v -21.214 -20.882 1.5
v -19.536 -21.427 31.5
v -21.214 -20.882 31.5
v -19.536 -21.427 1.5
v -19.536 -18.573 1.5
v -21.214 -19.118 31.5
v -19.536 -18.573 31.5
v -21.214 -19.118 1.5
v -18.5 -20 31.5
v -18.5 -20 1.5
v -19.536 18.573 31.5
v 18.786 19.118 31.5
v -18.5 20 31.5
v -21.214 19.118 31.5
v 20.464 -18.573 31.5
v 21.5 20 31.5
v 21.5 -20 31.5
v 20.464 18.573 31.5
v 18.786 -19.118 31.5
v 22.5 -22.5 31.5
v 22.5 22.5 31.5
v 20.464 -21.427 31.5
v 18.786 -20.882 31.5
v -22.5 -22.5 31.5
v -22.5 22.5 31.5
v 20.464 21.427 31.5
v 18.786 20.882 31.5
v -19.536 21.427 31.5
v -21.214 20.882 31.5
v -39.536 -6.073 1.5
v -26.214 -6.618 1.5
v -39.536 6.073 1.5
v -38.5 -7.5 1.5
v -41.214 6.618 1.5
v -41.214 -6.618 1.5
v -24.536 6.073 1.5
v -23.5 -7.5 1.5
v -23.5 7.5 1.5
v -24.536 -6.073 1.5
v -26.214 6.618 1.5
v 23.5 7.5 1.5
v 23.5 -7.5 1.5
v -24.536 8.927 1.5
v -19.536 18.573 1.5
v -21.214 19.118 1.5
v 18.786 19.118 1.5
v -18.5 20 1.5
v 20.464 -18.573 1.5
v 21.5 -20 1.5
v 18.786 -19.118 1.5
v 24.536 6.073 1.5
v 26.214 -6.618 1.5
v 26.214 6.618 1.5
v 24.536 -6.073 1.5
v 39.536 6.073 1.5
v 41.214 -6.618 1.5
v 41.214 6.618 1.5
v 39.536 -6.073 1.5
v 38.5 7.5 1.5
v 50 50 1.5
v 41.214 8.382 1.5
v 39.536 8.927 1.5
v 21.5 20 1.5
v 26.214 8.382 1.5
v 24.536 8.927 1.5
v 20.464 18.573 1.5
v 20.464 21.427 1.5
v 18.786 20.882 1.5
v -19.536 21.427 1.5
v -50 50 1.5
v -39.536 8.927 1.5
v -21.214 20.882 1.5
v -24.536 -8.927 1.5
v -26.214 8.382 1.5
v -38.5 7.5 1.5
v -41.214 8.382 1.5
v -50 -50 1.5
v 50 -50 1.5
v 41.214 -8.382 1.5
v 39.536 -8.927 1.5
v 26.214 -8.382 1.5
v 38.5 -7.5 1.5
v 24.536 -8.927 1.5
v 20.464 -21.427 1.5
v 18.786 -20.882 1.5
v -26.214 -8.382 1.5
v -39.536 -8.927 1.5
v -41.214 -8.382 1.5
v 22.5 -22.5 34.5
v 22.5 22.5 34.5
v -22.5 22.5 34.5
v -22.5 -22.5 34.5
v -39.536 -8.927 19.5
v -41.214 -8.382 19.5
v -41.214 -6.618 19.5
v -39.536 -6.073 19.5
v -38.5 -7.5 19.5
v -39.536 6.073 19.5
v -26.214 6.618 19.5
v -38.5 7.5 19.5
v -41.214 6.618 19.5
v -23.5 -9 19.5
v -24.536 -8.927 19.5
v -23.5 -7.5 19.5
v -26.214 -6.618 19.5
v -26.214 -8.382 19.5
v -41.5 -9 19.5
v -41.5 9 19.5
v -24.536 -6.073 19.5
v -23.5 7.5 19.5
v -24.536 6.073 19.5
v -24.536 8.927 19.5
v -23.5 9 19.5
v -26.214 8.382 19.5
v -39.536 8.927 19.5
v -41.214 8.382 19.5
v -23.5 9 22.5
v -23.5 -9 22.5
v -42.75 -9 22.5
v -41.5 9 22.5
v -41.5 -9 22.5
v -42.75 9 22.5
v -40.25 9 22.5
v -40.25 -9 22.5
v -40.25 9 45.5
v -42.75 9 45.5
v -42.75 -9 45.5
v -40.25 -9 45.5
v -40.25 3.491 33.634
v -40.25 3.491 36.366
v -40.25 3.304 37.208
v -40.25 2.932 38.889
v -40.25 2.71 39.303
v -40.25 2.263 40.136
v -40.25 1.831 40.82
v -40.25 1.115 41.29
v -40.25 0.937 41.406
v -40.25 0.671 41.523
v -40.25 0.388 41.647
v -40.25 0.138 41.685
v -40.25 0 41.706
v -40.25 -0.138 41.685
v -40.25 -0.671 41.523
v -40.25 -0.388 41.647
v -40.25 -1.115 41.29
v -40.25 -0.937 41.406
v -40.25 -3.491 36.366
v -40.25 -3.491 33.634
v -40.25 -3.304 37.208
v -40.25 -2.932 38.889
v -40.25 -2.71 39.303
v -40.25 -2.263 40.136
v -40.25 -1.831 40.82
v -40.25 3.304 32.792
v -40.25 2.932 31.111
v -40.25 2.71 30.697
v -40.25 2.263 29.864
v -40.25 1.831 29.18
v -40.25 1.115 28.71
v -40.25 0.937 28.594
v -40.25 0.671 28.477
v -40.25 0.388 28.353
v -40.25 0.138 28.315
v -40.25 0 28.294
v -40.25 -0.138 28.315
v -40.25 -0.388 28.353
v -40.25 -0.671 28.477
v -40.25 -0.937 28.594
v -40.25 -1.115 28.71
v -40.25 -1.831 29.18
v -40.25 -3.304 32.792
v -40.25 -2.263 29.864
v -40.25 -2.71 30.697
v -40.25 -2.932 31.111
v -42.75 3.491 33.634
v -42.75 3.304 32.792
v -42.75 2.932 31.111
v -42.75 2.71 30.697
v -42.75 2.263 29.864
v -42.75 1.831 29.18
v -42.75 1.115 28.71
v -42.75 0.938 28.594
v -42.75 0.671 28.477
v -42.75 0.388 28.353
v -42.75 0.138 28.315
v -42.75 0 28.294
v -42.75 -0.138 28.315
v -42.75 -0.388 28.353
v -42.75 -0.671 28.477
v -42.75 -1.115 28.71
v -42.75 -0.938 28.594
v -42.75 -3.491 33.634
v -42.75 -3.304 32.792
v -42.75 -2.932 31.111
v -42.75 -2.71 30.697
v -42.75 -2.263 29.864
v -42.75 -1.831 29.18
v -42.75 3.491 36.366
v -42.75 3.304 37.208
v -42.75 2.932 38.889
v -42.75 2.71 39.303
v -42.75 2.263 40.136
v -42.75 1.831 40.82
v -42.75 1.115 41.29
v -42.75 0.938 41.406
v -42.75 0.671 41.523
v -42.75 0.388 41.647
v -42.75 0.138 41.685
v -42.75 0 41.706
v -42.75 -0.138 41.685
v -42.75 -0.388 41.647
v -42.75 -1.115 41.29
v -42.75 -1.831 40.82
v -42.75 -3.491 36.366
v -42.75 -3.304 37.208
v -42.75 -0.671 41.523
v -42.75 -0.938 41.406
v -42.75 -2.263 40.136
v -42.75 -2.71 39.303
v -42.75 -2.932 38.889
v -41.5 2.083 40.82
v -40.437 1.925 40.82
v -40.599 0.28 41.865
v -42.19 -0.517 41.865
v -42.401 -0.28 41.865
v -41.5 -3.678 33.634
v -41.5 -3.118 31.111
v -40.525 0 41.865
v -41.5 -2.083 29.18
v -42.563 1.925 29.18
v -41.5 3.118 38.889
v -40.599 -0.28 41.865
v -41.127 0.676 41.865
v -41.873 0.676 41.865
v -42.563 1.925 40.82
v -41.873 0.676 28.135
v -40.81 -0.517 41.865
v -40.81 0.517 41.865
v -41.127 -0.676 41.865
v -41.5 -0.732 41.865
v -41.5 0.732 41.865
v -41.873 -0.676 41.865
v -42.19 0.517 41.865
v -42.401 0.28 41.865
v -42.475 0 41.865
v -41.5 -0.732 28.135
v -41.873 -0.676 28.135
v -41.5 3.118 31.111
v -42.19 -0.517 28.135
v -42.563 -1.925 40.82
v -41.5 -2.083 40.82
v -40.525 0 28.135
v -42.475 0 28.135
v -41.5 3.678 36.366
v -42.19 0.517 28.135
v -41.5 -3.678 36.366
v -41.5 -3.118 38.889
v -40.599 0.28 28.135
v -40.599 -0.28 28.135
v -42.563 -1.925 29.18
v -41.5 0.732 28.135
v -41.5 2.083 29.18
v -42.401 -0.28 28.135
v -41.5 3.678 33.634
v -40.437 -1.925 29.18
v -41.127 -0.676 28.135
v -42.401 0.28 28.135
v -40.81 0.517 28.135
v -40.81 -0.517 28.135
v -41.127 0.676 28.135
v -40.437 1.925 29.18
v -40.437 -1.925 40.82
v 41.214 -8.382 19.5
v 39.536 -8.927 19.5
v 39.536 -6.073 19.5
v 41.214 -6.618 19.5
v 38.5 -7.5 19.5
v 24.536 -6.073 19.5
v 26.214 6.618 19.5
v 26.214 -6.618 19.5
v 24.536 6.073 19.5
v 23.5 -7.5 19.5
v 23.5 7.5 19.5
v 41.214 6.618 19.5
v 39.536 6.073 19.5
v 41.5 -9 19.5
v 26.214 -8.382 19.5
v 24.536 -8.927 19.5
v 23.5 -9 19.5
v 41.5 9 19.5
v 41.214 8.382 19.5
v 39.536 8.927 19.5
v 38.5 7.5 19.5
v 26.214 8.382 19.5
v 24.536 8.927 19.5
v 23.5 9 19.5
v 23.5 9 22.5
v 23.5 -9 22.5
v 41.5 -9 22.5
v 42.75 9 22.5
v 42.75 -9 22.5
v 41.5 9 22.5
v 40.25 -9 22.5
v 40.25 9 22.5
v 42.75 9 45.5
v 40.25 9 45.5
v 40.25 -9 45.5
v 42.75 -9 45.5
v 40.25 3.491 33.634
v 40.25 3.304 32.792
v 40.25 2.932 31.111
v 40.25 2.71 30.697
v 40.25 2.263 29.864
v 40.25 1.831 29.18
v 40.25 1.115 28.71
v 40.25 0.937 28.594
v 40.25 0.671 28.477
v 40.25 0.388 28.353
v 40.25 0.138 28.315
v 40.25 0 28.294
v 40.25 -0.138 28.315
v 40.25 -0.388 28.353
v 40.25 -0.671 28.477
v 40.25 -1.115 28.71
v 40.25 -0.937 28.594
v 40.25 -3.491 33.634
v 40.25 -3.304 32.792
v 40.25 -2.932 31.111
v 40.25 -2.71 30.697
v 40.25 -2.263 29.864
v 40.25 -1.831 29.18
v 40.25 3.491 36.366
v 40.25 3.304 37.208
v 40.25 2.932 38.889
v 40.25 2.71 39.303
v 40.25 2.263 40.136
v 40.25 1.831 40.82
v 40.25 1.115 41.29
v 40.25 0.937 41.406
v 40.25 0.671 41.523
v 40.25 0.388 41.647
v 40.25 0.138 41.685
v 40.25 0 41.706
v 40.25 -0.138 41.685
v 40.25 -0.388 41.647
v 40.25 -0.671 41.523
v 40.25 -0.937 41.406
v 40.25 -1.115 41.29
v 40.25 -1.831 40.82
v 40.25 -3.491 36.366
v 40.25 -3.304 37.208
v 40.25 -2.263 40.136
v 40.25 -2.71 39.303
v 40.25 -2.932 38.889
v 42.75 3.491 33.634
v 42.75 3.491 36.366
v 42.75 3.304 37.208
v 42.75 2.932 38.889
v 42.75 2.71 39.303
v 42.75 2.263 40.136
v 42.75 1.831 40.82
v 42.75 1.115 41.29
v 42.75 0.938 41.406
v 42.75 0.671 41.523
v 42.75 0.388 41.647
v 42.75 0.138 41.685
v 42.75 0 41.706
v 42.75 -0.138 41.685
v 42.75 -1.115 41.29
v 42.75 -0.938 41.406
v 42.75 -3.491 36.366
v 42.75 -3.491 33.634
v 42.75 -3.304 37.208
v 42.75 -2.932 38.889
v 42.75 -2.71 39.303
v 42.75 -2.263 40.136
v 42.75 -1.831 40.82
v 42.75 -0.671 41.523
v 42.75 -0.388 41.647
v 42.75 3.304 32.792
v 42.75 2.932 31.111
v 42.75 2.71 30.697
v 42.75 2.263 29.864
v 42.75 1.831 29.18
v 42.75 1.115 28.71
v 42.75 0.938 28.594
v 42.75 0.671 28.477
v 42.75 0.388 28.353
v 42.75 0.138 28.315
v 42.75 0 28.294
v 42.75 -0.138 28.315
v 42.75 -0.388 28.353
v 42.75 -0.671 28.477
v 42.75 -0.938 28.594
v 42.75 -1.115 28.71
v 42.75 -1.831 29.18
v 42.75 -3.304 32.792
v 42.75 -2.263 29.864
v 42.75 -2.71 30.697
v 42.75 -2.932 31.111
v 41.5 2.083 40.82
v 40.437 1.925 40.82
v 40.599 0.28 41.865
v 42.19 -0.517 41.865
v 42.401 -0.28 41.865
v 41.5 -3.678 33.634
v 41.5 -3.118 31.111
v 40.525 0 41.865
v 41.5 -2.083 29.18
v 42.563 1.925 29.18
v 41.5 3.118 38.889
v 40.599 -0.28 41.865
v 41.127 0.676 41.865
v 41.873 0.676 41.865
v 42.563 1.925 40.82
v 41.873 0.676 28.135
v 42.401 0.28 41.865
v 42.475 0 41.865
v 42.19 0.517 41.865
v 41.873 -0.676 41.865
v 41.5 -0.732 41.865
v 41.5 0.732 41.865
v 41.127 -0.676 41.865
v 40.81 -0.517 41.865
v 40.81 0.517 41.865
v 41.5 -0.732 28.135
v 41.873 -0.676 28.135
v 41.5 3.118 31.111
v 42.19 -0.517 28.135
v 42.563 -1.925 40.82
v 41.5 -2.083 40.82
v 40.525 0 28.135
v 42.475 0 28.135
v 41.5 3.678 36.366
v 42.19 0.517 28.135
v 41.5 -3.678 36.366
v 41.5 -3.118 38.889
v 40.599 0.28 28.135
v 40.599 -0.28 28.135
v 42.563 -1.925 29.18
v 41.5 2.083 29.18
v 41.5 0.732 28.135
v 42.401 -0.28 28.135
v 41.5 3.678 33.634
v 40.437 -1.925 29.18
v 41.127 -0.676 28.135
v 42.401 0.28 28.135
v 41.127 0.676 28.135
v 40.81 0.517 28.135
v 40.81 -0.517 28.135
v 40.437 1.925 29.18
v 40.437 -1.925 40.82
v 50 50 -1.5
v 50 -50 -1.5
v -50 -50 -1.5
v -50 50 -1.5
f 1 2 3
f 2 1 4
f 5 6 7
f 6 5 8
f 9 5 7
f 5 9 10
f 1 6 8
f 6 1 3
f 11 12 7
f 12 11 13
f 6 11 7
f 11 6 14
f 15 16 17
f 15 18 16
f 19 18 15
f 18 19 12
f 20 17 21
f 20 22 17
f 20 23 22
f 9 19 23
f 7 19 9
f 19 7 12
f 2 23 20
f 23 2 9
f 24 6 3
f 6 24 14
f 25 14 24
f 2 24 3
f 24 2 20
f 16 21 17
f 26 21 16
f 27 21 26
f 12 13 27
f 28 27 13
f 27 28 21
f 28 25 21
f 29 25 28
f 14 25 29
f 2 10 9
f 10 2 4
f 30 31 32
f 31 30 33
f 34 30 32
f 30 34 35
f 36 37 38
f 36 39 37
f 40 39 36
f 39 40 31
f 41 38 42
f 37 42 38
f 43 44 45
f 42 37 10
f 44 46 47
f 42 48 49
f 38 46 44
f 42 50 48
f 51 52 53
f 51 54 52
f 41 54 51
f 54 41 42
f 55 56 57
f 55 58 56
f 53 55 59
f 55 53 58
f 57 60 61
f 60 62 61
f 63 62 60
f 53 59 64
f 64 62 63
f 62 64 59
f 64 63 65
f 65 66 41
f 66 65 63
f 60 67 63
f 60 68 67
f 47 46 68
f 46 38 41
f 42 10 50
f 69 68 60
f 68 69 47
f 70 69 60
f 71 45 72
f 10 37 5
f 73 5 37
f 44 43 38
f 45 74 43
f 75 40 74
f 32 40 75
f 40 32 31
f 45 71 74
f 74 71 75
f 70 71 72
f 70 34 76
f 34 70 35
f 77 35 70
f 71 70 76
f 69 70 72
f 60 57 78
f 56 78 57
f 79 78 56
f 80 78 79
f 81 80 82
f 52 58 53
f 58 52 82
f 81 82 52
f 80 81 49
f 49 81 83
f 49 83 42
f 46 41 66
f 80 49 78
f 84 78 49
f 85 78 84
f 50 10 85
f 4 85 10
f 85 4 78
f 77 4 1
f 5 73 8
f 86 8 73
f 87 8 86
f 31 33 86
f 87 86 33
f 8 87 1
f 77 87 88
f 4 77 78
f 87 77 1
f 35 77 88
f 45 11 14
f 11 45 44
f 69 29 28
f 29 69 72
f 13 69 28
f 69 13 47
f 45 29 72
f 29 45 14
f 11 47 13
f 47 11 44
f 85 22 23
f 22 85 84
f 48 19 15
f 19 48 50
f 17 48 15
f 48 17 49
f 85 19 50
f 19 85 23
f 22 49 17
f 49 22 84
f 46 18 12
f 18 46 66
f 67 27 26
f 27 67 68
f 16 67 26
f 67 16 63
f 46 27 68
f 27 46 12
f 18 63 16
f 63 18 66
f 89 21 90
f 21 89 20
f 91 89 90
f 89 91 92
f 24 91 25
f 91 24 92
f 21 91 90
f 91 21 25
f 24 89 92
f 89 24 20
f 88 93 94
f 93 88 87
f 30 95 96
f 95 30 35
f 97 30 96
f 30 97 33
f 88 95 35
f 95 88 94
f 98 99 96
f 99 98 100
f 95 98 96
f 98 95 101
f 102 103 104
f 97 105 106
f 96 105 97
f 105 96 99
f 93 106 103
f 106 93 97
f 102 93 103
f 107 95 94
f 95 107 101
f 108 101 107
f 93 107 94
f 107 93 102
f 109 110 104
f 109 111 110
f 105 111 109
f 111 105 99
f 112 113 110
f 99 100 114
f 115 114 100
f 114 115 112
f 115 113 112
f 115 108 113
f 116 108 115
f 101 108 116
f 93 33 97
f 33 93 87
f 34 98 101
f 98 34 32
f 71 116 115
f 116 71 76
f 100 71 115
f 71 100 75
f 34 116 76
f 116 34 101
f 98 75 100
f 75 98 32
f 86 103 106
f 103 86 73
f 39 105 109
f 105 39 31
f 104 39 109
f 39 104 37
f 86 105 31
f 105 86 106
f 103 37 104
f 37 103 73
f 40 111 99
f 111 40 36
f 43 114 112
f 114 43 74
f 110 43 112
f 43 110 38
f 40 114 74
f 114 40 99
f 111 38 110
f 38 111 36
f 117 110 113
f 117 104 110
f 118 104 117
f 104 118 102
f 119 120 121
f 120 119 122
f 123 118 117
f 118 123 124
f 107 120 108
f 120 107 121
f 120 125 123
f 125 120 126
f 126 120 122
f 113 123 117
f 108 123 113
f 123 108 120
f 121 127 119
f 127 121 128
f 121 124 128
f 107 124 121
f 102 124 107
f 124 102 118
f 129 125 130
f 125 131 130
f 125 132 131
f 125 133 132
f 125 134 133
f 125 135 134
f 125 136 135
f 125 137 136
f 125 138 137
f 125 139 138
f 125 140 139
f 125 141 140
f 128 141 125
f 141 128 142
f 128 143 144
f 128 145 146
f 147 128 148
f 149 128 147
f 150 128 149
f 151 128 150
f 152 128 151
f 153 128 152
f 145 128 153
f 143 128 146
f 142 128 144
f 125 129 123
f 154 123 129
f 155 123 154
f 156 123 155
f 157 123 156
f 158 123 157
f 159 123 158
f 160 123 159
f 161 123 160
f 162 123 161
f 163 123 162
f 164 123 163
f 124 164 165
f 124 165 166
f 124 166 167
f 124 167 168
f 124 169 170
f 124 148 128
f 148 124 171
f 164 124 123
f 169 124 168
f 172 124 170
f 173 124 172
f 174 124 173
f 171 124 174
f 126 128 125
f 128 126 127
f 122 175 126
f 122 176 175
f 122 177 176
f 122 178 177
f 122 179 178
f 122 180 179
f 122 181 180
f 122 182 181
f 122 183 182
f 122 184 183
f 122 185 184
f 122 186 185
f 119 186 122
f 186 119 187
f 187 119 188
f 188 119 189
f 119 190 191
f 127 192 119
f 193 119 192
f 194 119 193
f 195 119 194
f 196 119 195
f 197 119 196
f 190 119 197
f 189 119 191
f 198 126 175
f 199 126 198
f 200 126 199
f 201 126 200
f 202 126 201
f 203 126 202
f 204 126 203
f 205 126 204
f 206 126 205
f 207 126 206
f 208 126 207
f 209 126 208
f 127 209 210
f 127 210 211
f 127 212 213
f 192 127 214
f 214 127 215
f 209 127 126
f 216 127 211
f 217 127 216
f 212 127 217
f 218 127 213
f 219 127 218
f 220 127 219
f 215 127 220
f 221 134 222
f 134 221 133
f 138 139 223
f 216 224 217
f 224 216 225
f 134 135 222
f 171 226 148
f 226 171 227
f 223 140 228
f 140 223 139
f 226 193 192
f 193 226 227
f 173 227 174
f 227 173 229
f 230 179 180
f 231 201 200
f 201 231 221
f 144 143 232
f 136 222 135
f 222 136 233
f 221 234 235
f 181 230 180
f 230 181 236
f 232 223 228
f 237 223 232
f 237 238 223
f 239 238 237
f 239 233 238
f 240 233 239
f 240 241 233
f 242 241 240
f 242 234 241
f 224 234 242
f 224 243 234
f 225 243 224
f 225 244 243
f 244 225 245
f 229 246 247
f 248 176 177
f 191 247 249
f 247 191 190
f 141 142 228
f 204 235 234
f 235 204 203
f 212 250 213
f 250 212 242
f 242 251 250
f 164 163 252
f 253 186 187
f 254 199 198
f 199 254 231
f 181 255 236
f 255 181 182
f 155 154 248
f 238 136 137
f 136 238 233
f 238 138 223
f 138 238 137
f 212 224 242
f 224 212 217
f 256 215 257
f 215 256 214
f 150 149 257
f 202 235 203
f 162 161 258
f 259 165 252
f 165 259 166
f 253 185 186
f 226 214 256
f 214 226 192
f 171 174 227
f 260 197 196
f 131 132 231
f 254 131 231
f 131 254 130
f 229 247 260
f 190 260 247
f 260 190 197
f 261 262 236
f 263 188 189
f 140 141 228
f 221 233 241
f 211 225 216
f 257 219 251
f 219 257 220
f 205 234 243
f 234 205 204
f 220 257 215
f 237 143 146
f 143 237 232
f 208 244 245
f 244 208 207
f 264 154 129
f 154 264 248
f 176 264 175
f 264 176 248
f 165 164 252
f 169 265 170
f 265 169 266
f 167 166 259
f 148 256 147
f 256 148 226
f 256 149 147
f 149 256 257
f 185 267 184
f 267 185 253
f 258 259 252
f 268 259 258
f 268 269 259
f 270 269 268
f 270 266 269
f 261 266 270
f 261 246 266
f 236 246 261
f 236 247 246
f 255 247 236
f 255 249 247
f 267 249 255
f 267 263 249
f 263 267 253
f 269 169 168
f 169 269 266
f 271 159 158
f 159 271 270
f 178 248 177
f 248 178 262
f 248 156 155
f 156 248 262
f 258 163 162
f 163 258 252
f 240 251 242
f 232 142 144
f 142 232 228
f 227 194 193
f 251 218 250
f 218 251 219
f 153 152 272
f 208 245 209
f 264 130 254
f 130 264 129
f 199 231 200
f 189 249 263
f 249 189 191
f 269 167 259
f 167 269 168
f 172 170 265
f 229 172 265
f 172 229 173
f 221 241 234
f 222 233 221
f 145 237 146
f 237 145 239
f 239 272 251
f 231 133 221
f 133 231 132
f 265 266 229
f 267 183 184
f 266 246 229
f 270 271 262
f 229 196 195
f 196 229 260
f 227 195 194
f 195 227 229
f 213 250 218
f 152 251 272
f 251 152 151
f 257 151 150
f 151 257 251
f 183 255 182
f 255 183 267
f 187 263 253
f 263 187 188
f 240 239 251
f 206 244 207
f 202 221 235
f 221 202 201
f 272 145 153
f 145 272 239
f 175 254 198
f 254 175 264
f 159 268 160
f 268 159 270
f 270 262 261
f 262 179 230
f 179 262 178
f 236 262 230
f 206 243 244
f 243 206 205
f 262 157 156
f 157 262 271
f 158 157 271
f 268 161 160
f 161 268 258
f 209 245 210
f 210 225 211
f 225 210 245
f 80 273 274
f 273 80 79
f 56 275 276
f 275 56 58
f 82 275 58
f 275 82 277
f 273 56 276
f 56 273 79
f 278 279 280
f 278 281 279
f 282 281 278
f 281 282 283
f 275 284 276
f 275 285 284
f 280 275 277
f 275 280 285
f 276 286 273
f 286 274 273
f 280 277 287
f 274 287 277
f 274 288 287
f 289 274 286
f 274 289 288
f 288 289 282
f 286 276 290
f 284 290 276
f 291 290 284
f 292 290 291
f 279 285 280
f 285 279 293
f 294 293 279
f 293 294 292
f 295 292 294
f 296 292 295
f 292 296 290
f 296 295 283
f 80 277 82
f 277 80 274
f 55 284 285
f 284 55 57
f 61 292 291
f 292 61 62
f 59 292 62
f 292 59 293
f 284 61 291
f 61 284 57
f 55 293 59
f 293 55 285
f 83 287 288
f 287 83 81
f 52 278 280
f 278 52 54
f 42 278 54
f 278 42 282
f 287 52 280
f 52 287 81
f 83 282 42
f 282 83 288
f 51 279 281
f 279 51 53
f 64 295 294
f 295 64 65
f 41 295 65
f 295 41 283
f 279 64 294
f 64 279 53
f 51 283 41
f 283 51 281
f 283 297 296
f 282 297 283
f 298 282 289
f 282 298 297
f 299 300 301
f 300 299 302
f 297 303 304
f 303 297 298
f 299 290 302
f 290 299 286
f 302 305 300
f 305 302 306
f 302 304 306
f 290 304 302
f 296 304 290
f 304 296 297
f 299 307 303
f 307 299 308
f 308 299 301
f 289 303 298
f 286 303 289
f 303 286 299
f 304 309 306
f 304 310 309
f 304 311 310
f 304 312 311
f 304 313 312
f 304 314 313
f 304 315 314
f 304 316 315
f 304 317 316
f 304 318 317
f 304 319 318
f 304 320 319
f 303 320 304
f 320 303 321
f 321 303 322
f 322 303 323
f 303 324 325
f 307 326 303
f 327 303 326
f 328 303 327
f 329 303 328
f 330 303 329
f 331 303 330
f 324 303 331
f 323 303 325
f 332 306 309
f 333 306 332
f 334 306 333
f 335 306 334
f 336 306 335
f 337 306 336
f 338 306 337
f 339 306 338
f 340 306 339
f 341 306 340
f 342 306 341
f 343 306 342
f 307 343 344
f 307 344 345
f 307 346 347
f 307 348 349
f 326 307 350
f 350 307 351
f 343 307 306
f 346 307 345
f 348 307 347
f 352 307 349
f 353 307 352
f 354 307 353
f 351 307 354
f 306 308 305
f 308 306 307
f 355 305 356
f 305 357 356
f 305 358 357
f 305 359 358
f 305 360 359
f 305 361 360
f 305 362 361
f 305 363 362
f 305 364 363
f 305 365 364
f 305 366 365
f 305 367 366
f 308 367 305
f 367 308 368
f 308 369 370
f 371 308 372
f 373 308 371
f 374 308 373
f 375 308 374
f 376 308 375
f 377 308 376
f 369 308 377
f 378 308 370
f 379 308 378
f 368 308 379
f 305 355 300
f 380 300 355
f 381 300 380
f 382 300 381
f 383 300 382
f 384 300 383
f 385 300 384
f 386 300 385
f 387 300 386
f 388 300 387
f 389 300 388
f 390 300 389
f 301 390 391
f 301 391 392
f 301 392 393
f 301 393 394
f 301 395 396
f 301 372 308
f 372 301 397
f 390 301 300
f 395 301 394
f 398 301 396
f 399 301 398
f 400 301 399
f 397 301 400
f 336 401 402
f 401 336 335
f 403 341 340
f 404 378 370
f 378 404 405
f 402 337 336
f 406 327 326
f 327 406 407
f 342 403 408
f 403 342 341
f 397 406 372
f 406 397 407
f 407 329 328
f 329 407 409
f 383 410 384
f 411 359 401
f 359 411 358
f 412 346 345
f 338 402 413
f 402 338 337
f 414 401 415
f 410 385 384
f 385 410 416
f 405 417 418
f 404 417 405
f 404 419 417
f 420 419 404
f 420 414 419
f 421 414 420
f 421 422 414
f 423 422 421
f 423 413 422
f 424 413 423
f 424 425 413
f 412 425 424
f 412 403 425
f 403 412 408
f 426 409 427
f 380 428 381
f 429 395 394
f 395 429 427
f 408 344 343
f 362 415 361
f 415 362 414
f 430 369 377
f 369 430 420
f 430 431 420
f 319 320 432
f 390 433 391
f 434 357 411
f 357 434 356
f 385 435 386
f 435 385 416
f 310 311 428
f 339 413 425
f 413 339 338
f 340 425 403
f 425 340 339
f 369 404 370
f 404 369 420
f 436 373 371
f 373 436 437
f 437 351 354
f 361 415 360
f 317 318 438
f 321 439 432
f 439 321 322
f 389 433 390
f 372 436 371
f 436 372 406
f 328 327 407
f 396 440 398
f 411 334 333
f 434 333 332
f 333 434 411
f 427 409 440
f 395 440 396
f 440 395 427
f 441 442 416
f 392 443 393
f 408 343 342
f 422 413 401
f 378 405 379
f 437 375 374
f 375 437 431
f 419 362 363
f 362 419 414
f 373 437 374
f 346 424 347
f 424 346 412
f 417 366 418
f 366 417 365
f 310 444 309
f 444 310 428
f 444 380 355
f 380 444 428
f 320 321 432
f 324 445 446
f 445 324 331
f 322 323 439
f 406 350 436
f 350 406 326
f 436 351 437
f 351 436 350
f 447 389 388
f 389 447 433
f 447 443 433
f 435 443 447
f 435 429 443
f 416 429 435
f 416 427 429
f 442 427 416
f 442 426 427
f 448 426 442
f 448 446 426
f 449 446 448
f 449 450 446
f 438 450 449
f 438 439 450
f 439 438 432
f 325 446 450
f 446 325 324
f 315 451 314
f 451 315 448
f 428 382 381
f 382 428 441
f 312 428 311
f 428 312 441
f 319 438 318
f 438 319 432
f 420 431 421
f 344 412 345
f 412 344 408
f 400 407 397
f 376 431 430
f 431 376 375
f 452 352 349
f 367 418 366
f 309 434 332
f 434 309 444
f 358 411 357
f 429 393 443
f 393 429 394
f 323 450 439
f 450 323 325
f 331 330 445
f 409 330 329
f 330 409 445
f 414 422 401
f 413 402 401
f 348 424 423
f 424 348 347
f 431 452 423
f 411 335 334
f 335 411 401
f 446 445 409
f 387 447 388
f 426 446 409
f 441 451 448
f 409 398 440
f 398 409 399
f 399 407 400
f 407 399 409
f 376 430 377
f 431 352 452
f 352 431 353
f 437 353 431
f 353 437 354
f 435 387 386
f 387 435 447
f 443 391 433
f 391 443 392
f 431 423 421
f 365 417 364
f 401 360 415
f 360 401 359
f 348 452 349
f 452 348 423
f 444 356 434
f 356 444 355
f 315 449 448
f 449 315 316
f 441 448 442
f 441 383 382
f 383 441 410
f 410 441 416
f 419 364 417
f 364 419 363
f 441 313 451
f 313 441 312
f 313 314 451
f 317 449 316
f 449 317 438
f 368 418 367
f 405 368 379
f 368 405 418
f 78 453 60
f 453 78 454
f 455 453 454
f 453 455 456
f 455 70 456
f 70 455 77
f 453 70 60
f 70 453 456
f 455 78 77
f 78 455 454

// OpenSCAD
// file: libreriamuebles.scad
module piso()
{
    cube([100,100,3], center=true);
}

module mesa()
{
    //30 pulgadas es el tamano normal de un mesa
    //primer pierna
    translate([-20,-20,1.5])cylinder(h=30,r=1.5);
    //segunda pierna
    translate([-20,20,1.5])cylinder(h=30,r=1.5);
    //tercera pierna
    translate([20,-20,1.5])cylinder(h=30,r=1.5);
    //cuarta pierna
    translate([20,20,1.5])cylinder(h=30,r=1.5);
    
    //tapa de la mesa
    //altura mitad piso(z) + mitad mesa(z) + altura pata
    translate([0,0,33])cube([45,45,3],center=true);
}

module sillaBase()
{
    translate([-40,-7.5,1.5])cylinder(h=18,r=1.5);
    
    translate([-40,7.5,1.5])cylinder(h=18,r=1.5);
    
    translate([-25,-7.5,1.5])cylinder(h=18,r=1.5);
    
    translate([-25,7.5,1.5])cylinder(h=18,r=1.5);
    
    //altura mitad piso(z) + mitad mesa(z) + altura pata
    translate([-32.5,0,21])cube([18,18,3],center=true);
}

module espaldar()
{
    difference(){
    translate([-41.5,0,34])cube([2.5,18,23],center=true);
    translate([-41.5,0,35])scale([1,.75,1.4])sphere(5);     
    }
}

module silla()
{
        sillaBase();
        espaldar();
}

silla();
// main file
//Alfredo Alvarez
// Escena de piso mesa y silla o posibles sillas
use <libreriamuebles.scad>;

color("Lavender",1)piso();
color("Red",1)mesa();
color("Blue",1)silla();
mirror([1,0,0])silla();
